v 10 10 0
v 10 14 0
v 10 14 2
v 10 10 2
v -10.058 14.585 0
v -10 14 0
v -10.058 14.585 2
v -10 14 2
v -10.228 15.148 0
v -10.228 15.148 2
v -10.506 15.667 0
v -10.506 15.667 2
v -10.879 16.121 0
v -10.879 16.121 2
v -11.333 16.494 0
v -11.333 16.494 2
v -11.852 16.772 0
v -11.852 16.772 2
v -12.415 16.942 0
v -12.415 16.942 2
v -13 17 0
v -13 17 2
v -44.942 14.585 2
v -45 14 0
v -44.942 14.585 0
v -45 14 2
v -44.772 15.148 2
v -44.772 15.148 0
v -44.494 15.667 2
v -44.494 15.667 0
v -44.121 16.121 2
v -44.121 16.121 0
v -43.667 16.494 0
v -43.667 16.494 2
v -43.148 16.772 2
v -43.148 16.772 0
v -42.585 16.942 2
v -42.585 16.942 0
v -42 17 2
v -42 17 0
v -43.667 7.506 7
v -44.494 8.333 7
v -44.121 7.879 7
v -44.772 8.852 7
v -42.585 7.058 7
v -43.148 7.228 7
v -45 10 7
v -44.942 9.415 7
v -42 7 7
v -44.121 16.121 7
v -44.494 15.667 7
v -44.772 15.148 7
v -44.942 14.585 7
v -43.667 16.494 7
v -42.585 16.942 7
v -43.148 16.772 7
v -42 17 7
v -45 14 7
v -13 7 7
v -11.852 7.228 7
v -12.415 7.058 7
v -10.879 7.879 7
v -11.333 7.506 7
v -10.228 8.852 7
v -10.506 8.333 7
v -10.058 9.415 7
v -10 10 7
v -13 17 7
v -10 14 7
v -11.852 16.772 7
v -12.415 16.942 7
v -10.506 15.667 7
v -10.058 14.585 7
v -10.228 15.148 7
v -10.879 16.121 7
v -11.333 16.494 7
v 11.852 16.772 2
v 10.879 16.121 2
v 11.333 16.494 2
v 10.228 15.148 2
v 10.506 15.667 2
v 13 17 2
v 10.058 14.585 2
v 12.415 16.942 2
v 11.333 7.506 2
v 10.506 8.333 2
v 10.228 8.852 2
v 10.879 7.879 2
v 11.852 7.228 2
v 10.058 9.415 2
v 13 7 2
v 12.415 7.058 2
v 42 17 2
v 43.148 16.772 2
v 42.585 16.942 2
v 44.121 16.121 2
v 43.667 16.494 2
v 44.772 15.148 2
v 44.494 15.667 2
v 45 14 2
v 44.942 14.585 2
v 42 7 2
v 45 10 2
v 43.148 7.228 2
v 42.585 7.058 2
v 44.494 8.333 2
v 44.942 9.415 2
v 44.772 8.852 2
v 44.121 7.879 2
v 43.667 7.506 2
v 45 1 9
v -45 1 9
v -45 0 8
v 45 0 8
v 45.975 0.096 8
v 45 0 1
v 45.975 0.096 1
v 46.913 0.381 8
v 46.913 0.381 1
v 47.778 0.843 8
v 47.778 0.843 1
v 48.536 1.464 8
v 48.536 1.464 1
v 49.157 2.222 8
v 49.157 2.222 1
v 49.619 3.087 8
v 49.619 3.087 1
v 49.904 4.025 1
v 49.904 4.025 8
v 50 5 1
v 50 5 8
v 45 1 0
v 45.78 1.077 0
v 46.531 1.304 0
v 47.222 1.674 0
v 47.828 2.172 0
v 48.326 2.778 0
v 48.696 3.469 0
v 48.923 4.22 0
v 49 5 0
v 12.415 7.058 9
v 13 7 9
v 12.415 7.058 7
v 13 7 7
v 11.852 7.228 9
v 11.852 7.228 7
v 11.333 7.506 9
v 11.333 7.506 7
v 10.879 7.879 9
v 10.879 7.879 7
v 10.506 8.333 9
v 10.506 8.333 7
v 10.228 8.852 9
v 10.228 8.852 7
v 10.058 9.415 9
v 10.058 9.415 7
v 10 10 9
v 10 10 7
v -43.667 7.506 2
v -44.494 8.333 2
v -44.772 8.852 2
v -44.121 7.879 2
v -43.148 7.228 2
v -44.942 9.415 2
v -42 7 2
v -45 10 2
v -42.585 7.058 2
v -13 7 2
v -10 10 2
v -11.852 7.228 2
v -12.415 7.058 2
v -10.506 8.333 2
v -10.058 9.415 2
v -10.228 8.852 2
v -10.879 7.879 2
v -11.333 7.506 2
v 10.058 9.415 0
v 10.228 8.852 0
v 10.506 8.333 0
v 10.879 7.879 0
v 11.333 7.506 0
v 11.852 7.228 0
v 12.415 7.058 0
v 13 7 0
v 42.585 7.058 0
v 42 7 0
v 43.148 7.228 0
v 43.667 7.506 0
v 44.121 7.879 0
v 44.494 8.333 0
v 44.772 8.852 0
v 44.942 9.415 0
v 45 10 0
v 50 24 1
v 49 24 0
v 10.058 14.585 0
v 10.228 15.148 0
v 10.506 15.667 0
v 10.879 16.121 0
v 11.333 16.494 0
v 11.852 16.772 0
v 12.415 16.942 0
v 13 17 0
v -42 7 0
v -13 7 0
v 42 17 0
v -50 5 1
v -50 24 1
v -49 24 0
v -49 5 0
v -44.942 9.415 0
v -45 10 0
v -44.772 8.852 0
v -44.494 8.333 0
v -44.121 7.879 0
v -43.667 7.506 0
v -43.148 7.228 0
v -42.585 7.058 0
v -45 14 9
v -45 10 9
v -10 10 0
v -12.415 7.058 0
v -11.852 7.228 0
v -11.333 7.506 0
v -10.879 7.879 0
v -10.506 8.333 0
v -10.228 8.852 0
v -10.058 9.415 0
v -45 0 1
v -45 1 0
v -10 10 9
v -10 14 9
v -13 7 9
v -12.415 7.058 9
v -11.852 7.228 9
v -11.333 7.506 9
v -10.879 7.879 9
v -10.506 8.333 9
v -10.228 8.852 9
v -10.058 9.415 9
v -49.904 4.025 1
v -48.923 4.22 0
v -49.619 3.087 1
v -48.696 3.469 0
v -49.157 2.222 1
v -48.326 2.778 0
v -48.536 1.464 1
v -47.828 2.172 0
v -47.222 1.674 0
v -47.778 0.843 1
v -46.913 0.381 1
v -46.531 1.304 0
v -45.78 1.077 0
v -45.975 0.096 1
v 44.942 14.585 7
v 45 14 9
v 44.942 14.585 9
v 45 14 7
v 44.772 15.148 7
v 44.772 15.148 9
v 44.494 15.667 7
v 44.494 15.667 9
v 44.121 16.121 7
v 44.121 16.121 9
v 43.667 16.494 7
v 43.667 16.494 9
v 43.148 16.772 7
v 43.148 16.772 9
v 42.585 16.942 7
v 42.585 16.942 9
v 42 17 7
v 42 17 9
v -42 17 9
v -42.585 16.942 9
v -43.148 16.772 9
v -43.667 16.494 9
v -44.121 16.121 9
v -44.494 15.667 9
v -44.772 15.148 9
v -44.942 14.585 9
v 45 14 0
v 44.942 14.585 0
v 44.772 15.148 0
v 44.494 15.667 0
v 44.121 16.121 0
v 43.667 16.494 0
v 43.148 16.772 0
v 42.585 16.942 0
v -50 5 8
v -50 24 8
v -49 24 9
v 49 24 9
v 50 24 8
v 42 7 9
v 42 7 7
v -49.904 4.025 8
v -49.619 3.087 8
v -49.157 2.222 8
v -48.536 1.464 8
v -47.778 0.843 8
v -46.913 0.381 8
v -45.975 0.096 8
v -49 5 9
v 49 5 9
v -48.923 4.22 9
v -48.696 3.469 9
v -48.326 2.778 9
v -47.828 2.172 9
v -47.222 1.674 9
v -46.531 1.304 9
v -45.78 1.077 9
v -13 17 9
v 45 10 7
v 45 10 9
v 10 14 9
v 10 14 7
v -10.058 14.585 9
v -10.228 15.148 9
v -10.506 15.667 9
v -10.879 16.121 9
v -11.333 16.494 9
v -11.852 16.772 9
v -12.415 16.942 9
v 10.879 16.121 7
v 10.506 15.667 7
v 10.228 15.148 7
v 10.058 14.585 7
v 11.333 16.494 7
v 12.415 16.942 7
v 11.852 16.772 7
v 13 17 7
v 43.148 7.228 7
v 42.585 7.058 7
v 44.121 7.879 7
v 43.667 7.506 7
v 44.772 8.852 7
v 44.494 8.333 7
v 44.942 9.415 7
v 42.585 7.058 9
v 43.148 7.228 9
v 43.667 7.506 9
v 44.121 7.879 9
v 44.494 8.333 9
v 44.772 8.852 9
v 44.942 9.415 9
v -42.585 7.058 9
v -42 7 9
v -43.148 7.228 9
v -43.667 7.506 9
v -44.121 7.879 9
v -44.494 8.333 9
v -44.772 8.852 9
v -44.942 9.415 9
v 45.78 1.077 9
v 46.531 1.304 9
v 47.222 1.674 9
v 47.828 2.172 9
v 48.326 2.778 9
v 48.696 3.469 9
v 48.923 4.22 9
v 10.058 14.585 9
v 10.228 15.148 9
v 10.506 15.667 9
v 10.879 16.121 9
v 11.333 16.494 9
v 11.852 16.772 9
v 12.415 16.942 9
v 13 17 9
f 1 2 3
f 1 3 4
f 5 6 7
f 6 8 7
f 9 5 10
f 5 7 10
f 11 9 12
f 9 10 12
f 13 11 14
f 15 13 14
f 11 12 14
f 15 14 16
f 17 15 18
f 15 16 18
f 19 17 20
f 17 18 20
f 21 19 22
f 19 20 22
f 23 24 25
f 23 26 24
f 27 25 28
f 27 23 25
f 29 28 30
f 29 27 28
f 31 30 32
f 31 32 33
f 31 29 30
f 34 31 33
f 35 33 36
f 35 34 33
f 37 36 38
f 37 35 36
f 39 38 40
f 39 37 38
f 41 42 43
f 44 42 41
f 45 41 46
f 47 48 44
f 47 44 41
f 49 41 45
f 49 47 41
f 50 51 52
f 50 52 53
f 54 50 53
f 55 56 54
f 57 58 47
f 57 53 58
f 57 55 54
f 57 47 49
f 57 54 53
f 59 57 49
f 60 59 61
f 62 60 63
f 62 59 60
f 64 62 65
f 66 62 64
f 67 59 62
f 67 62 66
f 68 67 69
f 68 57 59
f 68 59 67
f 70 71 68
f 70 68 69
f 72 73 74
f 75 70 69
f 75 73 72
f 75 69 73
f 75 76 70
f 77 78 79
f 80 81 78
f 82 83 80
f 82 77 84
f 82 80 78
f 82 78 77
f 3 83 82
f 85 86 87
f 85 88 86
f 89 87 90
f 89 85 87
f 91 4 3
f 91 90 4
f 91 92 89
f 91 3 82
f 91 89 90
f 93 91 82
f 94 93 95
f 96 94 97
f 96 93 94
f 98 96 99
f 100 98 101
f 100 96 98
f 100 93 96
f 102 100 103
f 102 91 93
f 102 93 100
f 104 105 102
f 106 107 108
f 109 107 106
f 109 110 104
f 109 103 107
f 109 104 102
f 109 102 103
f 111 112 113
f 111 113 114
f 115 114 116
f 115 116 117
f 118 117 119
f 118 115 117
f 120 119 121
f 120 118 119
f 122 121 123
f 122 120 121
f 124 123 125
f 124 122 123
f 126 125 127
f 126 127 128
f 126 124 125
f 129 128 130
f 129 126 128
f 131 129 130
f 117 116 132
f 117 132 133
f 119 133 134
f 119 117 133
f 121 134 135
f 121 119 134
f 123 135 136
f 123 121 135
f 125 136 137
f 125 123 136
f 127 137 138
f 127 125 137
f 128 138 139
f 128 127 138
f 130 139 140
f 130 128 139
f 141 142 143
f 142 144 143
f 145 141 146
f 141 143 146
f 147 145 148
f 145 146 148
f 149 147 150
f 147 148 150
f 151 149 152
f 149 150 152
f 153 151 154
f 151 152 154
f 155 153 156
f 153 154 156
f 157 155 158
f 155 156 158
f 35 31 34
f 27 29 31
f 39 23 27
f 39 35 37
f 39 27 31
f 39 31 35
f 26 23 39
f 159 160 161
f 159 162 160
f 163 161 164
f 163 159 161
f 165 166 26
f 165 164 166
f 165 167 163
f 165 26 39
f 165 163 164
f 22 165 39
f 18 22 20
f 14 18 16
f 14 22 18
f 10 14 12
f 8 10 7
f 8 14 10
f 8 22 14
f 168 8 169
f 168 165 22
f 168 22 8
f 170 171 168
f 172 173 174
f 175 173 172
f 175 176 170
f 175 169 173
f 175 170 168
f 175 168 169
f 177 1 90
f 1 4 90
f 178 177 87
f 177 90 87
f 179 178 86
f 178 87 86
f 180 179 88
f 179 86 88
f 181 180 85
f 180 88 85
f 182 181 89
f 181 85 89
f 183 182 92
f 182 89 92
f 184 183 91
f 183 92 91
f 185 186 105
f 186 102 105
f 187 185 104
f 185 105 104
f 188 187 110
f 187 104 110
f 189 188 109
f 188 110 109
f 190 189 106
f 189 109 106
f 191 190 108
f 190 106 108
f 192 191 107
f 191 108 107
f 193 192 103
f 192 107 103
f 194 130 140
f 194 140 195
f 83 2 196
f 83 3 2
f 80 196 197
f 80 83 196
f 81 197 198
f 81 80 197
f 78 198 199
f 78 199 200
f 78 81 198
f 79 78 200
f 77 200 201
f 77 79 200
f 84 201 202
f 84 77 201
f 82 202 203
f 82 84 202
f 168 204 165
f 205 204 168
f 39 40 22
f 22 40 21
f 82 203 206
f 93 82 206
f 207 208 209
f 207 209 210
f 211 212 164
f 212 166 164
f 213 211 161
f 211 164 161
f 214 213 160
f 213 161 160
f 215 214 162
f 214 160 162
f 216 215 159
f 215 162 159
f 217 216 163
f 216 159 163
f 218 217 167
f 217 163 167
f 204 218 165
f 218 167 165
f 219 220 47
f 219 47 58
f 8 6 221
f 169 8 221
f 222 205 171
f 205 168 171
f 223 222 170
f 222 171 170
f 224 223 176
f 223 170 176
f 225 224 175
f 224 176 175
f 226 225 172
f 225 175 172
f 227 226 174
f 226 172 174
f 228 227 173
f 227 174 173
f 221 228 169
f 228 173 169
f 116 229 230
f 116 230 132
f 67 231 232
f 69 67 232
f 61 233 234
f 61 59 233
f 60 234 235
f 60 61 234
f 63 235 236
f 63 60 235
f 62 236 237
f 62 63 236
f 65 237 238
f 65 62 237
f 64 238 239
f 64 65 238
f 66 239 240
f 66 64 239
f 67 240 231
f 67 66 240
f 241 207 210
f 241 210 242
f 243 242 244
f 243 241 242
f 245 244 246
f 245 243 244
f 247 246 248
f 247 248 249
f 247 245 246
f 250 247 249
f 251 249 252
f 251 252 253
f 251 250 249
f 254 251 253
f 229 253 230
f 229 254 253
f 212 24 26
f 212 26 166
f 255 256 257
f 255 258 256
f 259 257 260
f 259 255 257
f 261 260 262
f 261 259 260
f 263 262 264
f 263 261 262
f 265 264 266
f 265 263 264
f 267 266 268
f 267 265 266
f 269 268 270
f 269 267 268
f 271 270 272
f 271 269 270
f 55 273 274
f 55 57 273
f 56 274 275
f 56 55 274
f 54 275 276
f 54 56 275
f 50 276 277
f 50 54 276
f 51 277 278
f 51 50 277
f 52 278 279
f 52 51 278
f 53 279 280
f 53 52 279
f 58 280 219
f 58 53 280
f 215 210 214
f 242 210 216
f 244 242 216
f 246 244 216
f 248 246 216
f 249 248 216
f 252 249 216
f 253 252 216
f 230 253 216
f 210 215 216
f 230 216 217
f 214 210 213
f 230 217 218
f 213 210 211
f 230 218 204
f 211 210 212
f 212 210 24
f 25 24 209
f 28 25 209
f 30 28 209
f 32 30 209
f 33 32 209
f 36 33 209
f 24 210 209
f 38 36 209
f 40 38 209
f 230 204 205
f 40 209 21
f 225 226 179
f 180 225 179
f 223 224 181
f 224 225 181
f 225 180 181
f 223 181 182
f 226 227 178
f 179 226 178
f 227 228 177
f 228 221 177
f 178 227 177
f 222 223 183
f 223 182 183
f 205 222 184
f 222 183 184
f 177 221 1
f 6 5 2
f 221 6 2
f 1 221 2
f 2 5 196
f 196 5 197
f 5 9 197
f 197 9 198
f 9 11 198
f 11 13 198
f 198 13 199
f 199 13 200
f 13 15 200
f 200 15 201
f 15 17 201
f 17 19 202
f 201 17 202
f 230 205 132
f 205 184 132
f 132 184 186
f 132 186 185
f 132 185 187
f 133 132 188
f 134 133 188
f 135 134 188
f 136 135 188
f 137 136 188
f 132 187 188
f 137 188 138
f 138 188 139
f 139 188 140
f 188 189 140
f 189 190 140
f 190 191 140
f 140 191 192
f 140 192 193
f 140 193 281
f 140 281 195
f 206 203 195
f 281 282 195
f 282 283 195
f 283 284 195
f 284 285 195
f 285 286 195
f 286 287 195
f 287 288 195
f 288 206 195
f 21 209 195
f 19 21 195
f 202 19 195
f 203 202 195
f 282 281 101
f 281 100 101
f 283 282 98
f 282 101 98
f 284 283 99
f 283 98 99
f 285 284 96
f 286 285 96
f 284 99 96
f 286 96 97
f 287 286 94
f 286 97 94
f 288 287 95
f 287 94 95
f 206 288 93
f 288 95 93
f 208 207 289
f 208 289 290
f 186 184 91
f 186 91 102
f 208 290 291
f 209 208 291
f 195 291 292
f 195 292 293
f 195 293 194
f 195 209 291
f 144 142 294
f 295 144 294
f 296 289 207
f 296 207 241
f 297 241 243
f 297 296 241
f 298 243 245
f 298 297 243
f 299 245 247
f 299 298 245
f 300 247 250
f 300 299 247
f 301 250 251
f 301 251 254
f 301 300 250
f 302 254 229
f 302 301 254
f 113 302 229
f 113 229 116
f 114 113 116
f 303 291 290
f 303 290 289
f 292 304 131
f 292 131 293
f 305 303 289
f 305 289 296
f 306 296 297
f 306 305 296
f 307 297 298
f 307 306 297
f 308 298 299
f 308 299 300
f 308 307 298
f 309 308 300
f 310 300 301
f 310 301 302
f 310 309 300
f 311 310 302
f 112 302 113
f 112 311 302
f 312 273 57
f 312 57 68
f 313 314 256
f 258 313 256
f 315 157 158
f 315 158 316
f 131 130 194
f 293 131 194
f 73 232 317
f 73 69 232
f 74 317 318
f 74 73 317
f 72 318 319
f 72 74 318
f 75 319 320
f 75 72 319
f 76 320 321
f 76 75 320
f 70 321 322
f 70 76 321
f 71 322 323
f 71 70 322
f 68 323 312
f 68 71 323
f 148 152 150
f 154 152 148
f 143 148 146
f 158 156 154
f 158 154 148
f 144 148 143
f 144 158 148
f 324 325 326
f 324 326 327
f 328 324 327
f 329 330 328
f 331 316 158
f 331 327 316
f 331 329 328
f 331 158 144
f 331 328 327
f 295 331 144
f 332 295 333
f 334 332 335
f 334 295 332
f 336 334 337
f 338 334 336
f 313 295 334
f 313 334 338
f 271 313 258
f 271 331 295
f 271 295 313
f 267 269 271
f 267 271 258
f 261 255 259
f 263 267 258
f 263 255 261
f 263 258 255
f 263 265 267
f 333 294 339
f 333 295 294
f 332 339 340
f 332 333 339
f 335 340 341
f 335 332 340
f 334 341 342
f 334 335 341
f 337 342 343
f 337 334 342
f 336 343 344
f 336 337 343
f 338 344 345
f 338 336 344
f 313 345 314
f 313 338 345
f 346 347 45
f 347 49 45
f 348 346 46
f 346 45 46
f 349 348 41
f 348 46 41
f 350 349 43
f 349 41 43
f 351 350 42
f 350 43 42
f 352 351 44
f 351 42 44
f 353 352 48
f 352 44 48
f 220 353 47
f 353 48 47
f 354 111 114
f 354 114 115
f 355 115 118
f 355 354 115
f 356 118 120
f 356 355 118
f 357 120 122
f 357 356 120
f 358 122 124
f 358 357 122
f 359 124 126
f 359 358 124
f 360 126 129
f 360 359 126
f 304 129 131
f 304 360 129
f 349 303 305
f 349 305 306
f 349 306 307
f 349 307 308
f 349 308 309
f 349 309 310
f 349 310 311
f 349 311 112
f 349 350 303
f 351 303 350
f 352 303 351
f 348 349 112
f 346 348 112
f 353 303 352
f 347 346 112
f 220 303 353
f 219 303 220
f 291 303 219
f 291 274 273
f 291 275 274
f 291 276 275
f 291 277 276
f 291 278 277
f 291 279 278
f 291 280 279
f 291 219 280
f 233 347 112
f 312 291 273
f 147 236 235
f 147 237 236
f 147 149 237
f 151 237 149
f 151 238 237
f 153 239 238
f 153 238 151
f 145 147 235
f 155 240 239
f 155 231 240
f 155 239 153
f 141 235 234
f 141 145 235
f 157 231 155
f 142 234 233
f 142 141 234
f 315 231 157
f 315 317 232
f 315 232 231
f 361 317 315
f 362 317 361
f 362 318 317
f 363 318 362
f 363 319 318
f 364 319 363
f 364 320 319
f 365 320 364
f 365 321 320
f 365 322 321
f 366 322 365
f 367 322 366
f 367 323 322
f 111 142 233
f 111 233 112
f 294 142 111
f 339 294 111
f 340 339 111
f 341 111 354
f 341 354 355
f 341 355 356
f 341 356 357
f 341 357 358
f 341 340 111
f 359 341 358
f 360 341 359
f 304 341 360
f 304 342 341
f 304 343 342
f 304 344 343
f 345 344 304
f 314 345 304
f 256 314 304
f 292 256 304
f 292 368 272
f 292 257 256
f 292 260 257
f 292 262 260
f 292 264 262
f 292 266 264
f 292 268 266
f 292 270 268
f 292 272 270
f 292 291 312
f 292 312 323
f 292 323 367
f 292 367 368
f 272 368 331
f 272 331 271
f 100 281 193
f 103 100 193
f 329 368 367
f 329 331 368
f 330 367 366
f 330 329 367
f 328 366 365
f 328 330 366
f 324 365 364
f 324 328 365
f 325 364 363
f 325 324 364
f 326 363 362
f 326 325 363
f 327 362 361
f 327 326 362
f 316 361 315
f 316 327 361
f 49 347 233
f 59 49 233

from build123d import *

# Parameters (mm, degrees)
F0_W     = 100
F0_H     = 24
F1_DEPTH = 9
F2_R     = 5
F3_W     = 35
F3_H     = 10
F4_W     = 35
F4_H     = 10
F5_DEPTH = 2
F6_R     = 3
F7_W     = 35
F7_H     = 10
F8_DEPTH = 2
F9_R     = 3
F10_SIZE = 1


with BuildPart() as f1:
    # F0 (on Top) → F1 (new body)
    with BuildSketch(Plane.XY):
        with Locations((0, 12)):
            Rectangle(F0_W, F0_H)
    extrude(amount=F1_DEPTH)

    # F2
    f2_edges = [f1.edges().sort_by_distance(p)[0] for p in [
        (-50, 0, 4.5),
        (50, 0, 4.5),
    ]]
    fillet(f2_edges, radius=F2_R)

    # F3 (on face) + F4 (on face) → F5 (cut)
    with BuildSketch(Plane.XY.offset(9)):
        with Locations((-27.5, 12)):
            Rectangle(F3_W, F3_H)
    with BuildSketch(Plane.XY.offset(9)):
        with Locations((27.5, 12)):
            Rectangle(F4_W, F4_H)
    extrude(amount=-F5_DEPTH, mode=Mode.SUBTRACT)

    # F6
    f6_edges = [f1.edges().sort_by_distance(p)[0] for p in [
        (-45, 7, 8),
        (-45, 17, 8),
        (-10, 17, 8),
        (10, 7, 8),
        (-10, 7, 8),
        (45, 7, 8),
        (45, 17, 8),
        (10, 17, 8),
    ]]
    fillet(f6_edges, radius=F6_R)

    # F7 (on face) → F8 (cut)
    with BuildSketch(Plane(origin=(0, 0, 0), x_dir=(1, 0, 0), z_dir=(0, 0, -1))):
        with Locations((-27.5, -12)):
            Rectangle(F7_W, F7_H)
        with Locations((27.5, -12)):
            Rectangle(F7_W, F7_H)
    extrude(amount=-F8_DEPTH, mode=Mode.SUBTRACT)

    # F9
    f9_edges = [f1.edges().sort_by_distance(p)[0] for p in [
        (45, 17, 1),
        (-10, 17, 1),
        (10, 17, 1),
        (-45, 17, 1),
        (10, 7, 1),
        (-45, 7, 1),
        (-10, 7, 1),
        (45, 7, 1),
    ]]
    fillet(f9_edges, radius=F9_R)

    # F10
    f10_edges = [f1.edges().sort_by_distance(p)[0] for p in [
        (0, 0, 9),
        (0, 0, 0),
    ]]
    chamfer(f10_edges, length=F10_SIZE)


solid = f1.part
